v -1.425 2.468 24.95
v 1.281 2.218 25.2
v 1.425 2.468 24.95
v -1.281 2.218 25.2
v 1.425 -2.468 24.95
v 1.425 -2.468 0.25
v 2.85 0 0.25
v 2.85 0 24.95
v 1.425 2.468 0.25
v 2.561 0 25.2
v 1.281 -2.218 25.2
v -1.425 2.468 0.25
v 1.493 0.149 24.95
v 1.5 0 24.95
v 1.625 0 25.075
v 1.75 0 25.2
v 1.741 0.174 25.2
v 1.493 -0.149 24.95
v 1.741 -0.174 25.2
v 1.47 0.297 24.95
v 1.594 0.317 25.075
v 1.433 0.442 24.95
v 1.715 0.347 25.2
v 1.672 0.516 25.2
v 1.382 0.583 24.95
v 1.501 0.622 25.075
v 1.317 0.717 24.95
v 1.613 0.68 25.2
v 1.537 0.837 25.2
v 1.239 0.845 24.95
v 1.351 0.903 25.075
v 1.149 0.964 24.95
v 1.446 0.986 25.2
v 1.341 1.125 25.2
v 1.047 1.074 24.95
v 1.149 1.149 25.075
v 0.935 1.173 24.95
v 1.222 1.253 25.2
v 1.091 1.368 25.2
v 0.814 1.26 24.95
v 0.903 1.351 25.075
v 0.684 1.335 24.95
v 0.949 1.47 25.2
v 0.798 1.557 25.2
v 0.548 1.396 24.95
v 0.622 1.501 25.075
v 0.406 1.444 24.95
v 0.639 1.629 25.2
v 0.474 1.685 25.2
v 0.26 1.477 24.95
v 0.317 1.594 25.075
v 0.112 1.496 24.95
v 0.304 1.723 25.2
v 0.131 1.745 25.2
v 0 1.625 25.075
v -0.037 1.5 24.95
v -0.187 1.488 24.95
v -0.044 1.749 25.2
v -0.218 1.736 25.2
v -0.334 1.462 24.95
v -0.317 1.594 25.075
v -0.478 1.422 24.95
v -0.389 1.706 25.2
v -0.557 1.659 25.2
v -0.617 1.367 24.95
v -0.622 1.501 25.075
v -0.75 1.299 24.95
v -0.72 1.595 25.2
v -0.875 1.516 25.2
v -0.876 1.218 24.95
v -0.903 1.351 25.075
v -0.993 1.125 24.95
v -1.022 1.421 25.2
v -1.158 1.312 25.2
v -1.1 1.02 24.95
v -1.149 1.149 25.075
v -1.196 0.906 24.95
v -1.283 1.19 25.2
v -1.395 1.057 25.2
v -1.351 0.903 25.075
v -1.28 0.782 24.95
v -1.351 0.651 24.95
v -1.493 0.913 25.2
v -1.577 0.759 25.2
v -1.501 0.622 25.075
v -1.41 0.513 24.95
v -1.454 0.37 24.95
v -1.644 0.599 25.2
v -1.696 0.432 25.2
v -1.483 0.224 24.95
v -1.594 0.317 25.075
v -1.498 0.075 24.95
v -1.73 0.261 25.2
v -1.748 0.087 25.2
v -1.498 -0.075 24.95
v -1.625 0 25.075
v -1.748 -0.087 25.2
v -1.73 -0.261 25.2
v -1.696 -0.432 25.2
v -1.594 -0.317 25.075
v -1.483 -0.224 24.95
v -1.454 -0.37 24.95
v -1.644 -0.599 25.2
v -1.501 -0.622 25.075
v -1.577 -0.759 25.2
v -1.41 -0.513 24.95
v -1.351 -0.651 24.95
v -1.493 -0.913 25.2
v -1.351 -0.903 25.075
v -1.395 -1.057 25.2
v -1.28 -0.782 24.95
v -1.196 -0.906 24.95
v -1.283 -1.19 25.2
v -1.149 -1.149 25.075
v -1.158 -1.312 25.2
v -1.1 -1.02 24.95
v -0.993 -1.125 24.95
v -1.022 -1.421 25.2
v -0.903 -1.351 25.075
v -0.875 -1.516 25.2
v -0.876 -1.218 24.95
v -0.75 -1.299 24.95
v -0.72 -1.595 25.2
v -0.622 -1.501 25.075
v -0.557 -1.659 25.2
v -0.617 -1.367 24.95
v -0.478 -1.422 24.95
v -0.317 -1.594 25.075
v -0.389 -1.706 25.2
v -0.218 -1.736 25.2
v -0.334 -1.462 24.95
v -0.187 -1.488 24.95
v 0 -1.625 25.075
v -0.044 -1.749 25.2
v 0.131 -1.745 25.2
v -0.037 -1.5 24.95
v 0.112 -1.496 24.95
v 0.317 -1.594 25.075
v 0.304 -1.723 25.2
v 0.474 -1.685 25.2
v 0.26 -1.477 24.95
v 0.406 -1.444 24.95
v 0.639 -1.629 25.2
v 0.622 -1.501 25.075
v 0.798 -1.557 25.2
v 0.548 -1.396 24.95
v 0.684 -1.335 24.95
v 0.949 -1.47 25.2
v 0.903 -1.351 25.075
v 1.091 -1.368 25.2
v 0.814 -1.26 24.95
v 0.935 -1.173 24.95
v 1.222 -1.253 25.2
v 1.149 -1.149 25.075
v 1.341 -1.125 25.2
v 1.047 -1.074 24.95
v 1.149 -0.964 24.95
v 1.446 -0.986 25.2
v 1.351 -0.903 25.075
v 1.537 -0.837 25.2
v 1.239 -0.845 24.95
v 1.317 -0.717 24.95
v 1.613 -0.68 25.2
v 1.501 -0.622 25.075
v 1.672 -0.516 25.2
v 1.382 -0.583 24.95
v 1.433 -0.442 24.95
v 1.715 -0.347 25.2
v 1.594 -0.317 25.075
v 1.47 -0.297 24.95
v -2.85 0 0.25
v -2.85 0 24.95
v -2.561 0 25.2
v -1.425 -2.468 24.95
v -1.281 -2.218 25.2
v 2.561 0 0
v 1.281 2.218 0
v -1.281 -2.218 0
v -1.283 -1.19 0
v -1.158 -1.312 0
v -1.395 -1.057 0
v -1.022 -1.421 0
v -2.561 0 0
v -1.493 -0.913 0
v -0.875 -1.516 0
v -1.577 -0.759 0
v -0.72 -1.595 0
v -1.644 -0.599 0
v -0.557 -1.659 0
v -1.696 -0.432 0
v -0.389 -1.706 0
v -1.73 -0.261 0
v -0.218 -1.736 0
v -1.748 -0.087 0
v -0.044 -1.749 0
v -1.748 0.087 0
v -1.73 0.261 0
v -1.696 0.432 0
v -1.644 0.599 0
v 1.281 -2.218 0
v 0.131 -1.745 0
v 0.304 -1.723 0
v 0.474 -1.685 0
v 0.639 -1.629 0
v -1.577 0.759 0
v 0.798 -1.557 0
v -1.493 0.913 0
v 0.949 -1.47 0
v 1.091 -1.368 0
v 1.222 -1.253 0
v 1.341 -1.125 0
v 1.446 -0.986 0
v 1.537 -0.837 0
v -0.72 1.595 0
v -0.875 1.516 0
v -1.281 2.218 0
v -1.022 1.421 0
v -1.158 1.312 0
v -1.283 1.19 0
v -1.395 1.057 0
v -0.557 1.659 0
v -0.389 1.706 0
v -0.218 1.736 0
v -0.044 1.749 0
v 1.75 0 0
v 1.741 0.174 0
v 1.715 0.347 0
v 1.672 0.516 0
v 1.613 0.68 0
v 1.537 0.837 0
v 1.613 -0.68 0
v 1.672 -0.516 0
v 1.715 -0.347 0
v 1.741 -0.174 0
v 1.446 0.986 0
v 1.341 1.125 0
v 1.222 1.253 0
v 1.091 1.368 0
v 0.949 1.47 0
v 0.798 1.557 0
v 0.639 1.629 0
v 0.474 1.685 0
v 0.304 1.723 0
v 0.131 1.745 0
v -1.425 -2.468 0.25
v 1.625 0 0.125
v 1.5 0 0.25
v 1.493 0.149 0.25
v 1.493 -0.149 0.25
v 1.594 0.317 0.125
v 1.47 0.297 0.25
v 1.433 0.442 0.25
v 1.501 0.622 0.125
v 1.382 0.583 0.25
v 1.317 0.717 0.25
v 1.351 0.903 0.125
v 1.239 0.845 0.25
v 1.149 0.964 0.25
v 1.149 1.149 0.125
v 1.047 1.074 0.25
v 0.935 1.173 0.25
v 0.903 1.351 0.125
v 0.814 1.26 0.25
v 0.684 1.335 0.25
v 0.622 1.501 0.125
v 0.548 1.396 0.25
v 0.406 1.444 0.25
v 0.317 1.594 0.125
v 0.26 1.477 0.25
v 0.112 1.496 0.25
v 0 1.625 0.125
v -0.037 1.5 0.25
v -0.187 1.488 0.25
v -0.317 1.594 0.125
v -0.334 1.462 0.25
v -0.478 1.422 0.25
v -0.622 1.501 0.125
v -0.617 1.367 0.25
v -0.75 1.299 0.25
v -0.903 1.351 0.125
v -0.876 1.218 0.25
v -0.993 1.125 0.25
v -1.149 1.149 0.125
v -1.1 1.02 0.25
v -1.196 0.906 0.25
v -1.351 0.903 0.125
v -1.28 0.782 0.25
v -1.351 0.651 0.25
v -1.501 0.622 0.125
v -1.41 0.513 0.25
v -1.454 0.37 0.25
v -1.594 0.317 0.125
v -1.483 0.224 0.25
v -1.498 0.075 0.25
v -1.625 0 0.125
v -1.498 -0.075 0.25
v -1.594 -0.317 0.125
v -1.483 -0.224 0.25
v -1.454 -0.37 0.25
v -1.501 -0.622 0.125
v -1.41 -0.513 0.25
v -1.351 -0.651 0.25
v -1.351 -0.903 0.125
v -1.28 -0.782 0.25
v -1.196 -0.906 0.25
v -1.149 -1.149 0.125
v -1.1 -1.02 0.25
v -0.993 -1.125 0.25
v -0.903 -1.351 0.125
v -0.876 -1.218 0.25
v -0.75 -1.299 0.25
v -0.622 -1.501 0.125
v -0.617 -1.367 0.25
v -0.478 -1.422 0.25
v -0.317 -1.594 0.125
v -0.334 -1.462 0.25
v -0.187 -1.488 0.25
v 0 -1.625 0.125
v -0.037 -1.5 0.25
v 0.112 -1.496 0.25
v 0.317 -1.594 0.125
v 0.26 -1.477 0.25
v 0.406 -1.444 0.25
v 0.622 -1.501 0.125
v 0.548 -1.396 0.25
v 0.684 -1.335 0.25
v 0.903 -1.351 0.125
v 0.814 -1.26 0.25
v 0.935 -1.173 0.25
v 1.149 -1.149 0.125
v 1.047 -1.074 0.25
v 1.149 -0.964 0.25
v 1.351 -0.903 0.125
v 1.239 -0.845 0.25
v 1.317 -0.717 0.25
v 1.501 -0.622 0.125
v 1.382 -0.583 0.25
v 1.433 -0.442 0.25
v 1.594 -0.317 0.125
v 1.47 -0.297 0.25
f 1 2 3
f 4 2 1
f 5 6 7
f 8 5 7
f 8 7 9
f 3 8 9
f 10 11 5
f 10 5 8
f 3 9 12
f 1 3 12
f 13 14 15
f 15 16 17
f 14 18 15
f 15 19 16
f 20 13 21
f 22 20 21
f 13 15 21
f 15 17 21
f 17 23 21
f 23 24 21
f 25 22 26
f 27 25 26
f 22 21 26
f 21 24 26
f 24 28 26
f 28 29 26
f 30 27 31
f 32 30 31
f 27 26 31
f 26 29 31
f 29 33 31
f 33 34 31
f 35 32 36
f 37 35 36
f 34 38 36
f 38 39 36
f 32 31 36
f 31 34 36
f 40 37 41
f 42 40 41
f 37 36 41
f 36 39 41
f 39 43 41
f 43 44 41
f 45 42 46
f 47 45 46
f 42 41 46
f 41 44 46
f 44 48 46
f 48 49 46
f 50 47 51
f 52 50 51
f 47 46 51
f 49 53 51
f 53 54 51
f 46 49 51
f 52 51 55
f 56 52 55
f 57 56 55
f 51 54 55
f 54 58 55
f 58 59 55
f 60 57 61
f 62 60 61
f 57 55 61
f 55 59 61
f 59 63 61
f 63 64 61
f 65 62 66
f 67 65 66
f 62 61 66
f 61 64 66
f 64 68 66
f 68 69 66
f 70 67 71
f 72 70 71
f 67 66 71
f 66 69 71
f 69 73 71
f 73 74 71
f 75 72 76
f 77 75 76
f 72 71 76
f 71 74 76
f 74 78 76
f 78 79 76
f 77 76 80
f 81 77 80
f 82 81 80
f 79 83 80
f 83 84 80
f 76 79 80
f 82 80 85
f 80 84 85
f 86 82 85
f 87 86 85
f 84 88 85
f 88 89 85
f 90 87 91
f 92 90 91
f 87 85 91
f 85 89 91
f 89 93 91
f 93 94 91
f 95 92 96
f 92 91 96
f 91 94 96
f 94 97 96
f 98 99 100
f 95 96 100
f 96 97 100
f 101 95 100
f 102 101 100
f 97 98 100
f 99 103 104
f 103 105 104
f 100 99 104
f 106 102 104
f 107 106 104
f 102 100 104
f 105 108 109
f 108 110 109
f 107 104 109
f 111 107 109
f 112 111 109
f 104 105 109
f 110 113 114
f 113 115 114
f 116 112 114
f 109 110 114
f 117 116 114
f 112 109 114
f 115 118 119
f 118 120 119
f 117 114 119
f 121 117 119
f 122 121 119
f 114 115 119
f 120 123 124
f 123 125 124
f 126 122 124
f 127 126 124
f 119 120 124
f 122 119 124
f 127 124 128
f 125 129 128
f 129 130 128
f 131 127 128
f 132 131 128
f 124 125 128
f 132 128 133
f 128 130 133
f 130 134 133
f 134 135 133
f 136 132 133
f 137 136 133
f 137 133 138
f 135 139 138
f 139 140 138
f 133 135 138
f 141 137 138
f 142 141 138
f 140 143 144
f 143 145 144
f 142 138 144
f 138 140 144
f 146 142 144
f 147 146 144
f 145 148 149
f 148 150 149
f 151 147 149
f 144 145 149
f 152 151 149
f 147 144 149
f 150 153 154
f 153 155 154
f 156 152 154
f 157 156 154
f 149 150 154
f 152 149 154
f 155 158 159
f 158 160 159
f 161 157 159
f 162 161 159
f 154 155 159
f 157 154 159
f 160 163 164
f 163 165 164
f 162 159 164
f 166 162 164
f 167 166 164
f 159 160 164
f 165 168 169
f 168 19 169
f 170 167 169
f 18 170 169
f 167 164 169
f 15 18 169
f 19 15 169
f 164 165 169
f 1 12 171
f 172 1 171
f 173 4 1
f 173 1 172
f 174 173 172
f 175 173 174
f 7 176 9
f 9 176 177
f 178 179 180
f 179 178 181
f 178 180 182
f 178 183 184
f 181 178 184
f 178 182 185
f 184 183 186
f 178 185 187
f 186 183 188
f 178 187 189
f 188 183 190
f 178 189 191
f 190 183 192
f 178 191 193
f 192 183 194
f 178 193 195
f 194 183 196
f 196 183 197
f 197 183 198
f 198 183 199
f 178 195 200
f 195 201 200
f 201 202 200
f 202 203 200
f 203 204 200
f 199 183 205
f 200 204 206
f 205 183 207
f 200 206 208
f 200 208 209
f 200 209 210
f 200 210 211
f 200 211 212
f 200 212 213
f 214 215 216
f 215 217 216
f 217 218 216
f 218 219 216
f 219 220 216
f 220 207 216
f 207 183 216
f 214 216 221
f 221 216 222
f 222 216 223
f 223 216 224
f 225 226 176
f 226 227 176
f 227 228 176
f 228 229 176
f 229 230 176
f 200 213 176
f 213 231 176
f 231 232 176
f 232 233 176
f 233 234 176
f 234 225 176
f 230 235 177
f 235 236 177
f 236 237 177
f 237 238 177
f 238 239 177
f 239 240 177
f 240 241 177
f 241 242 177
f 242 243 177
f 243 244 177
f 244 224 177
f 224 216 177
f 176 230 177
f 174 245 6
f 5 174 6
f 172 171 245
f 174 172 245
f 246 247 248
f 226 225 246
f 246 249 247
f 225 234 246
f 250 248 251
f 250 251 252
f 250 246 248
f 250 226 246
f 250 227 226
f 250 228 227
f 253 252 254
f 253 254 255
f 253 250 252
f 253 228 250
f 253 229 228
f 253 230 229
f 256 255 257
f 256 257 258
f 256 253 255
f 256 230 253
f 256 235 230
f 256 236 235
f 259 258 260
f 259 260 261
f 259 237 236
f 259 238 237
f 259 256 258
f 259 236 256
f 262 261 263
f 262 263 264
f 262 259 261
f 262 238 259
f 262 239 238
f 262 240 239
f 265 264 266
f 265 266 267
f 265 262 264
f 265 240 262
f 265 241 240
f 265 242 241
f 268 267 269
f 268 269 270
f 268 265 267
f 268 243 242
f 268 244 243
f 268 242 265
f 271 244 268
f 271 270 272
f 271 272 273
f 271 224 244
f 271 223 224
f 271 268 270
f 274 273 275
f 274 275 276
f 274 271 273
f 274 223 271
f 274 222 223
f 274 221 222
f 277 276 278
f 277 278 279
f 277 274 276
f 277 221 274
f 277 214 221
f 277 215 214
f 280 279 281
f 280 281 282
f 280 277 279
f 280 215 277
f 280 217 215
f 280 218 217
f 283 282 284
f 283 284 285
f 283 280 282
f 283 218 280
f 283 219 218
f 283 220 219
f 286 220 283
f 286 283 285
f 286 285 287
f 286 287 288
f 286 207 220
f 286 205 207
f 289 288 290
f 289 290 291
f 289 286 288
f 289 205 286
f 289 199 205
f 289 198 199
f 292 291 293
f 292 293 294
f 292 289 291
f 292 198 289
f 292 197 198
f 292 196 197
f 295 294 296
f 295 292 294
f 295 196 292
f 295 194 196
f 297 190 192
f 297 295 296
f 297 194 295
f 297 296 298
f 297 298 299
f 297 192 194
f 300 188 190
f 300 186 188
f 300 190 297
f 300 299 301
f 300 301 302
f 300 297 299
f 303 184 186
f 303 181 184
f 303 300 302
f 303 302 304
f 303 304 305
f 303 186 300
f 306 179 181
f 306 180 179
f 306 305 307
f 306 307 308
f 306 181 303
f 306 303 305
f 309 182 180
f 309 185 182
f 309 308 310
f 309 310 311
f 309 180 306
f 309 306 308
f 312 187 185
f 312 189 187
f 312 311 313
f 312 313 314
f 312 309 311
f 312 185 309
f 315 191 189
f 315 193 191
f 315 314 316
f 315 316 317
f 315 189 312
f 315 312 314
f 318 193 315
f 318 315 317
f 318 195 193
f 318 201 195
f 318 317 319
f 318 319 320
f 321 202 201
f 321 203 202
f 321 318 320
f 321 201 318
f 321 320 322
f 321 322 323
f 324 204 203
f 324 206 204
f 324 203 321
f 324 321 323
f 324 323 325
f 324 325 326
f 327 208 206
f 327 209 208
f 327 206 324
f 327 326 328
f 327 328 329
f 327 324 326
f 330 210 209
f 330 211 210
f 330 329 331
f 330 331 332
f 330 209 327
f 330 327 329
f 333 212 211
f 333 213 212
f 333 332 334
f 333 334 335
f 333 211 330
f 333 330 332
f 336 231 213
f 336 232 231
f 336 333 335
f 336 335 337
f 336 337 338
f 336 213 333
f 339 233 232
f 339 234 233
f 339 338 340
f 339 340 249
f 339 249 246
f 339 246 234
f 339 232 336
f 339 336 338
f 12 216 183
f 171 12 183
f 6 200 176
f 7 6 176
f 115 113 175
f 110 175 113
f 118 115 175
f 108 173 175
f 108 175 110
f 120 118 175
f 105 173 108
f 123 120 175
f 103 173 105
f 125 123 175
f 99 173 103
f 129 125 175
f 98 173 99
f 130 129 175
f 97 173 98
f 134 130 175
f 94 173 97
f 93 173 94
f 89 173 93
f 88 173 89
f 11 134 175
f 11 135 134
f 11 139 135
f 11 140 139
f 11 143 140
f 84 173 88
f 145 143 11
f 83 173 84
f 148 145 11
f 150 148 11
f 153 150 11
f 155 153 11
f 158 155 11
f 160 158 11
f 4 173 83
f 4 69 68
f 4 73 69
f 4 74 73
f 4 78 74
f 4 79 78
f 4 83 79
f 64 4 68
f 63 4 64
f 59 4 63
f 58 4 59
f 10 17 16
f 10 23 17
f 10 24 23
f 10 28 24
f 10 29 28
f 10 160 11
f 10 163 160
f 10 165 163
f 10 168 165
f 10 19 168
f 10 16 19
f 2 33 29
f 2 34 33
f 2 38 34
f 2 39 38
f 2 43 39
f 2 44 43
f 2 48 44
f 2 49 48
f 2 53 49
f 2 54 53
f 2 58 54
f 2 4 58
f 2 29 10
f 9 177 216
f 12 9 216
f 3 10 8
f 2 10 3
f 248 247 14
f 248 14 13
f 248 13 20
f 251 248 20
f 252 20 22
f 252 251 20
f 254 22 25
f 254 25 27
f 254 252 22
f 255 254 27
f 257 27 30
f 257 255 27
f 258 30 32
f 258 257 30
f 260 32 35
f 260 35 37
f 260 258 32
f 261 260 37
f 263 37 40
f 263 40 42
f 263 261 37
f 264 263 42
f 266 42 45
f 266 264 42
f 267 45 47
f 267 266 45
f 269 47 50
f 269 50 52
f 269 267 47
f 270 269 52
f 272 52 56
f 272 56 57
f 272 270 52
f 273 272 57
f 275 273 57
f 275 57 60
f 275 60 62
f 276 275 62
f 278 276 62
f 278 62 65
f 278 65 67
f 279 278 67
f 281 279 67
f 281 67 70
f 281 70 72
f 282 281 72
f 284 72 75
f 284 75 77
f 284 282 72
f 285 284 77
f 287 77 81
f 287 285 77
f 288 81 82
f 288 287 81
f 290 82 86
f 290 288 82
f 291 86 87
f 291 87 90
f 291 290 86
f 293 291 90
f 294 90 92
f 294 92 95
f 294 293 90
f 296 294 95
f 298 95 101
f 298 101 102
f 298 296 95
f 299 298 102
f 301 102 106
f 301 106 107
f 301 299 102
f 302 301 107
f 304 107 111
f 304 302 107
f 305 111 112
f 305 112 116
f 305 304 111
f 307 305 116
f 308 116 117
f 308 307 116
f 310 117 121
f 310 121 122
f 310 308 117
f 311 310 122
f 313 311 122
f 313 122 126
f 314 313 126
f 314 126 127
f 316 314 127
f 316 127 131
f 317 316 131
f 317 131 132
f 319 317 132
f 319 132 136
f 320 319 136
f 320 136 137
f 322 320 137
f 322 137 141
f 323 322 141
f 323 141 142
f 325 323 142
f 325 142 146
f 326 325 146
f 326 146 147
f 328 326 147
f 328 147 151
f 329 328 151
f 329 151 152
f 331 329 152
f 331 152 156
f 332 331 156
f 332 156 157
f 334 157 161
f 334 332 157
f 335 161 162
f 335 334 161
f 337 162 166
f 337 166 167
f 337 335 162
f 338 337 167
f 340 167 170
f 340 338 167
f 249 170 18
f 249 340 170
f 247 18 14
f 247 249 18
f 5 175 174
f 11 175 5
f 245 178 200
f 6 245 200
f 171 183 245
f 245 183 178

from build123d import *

# Parameters (mm, degrees)
SKETCH_R     = 1.5
PAD_DEPTH    = 25.2
CHAMFER_SIZE = 0.25


with BuildPart() as part:
    # Sketch → Pad (new body)
    with BuildSketch(Plane.XY):
        Polygon((2.85, 0), (1.425, 2.468172), (-1.425, 2.468172), (-2.85, 0), (-1.425, -2.468172), (1.425, -2.468172), align=None)
        Circle(SKETCH_R, mode=Mode.SUBTRACT)
    extrude(amount=PAD_DEPTH)

    # Chamfer
    chamfer_edges = [part.edges().sort_by_distance(p)[0] for p in [
        (2.1375, 1.234086, 0),
        (0, 2.468172, 0),
        (-2.1375, 1.234086, 0),
        (-2.1375, -1.234086, 0),
        (0, -2.468172, 0),
        (2.1375, -1.234086, 0),
        (-1.5, 0, 0),
        (2.1375, 1.234086, 25.2),
        (0, 2.468172, 25.2),
        (-2.1375, 1.234086, 25.2),
        (-2.1375, -1.234086, 25.2),
        (0, -2.468172, 25.2),
        (2.1375, -1.234086, 25.2),
        (-1.5, 0, 25.2),
    ]]
    chamfer(chamfer_edges, length=CHAMFER_SIZE)


solid = part.part
